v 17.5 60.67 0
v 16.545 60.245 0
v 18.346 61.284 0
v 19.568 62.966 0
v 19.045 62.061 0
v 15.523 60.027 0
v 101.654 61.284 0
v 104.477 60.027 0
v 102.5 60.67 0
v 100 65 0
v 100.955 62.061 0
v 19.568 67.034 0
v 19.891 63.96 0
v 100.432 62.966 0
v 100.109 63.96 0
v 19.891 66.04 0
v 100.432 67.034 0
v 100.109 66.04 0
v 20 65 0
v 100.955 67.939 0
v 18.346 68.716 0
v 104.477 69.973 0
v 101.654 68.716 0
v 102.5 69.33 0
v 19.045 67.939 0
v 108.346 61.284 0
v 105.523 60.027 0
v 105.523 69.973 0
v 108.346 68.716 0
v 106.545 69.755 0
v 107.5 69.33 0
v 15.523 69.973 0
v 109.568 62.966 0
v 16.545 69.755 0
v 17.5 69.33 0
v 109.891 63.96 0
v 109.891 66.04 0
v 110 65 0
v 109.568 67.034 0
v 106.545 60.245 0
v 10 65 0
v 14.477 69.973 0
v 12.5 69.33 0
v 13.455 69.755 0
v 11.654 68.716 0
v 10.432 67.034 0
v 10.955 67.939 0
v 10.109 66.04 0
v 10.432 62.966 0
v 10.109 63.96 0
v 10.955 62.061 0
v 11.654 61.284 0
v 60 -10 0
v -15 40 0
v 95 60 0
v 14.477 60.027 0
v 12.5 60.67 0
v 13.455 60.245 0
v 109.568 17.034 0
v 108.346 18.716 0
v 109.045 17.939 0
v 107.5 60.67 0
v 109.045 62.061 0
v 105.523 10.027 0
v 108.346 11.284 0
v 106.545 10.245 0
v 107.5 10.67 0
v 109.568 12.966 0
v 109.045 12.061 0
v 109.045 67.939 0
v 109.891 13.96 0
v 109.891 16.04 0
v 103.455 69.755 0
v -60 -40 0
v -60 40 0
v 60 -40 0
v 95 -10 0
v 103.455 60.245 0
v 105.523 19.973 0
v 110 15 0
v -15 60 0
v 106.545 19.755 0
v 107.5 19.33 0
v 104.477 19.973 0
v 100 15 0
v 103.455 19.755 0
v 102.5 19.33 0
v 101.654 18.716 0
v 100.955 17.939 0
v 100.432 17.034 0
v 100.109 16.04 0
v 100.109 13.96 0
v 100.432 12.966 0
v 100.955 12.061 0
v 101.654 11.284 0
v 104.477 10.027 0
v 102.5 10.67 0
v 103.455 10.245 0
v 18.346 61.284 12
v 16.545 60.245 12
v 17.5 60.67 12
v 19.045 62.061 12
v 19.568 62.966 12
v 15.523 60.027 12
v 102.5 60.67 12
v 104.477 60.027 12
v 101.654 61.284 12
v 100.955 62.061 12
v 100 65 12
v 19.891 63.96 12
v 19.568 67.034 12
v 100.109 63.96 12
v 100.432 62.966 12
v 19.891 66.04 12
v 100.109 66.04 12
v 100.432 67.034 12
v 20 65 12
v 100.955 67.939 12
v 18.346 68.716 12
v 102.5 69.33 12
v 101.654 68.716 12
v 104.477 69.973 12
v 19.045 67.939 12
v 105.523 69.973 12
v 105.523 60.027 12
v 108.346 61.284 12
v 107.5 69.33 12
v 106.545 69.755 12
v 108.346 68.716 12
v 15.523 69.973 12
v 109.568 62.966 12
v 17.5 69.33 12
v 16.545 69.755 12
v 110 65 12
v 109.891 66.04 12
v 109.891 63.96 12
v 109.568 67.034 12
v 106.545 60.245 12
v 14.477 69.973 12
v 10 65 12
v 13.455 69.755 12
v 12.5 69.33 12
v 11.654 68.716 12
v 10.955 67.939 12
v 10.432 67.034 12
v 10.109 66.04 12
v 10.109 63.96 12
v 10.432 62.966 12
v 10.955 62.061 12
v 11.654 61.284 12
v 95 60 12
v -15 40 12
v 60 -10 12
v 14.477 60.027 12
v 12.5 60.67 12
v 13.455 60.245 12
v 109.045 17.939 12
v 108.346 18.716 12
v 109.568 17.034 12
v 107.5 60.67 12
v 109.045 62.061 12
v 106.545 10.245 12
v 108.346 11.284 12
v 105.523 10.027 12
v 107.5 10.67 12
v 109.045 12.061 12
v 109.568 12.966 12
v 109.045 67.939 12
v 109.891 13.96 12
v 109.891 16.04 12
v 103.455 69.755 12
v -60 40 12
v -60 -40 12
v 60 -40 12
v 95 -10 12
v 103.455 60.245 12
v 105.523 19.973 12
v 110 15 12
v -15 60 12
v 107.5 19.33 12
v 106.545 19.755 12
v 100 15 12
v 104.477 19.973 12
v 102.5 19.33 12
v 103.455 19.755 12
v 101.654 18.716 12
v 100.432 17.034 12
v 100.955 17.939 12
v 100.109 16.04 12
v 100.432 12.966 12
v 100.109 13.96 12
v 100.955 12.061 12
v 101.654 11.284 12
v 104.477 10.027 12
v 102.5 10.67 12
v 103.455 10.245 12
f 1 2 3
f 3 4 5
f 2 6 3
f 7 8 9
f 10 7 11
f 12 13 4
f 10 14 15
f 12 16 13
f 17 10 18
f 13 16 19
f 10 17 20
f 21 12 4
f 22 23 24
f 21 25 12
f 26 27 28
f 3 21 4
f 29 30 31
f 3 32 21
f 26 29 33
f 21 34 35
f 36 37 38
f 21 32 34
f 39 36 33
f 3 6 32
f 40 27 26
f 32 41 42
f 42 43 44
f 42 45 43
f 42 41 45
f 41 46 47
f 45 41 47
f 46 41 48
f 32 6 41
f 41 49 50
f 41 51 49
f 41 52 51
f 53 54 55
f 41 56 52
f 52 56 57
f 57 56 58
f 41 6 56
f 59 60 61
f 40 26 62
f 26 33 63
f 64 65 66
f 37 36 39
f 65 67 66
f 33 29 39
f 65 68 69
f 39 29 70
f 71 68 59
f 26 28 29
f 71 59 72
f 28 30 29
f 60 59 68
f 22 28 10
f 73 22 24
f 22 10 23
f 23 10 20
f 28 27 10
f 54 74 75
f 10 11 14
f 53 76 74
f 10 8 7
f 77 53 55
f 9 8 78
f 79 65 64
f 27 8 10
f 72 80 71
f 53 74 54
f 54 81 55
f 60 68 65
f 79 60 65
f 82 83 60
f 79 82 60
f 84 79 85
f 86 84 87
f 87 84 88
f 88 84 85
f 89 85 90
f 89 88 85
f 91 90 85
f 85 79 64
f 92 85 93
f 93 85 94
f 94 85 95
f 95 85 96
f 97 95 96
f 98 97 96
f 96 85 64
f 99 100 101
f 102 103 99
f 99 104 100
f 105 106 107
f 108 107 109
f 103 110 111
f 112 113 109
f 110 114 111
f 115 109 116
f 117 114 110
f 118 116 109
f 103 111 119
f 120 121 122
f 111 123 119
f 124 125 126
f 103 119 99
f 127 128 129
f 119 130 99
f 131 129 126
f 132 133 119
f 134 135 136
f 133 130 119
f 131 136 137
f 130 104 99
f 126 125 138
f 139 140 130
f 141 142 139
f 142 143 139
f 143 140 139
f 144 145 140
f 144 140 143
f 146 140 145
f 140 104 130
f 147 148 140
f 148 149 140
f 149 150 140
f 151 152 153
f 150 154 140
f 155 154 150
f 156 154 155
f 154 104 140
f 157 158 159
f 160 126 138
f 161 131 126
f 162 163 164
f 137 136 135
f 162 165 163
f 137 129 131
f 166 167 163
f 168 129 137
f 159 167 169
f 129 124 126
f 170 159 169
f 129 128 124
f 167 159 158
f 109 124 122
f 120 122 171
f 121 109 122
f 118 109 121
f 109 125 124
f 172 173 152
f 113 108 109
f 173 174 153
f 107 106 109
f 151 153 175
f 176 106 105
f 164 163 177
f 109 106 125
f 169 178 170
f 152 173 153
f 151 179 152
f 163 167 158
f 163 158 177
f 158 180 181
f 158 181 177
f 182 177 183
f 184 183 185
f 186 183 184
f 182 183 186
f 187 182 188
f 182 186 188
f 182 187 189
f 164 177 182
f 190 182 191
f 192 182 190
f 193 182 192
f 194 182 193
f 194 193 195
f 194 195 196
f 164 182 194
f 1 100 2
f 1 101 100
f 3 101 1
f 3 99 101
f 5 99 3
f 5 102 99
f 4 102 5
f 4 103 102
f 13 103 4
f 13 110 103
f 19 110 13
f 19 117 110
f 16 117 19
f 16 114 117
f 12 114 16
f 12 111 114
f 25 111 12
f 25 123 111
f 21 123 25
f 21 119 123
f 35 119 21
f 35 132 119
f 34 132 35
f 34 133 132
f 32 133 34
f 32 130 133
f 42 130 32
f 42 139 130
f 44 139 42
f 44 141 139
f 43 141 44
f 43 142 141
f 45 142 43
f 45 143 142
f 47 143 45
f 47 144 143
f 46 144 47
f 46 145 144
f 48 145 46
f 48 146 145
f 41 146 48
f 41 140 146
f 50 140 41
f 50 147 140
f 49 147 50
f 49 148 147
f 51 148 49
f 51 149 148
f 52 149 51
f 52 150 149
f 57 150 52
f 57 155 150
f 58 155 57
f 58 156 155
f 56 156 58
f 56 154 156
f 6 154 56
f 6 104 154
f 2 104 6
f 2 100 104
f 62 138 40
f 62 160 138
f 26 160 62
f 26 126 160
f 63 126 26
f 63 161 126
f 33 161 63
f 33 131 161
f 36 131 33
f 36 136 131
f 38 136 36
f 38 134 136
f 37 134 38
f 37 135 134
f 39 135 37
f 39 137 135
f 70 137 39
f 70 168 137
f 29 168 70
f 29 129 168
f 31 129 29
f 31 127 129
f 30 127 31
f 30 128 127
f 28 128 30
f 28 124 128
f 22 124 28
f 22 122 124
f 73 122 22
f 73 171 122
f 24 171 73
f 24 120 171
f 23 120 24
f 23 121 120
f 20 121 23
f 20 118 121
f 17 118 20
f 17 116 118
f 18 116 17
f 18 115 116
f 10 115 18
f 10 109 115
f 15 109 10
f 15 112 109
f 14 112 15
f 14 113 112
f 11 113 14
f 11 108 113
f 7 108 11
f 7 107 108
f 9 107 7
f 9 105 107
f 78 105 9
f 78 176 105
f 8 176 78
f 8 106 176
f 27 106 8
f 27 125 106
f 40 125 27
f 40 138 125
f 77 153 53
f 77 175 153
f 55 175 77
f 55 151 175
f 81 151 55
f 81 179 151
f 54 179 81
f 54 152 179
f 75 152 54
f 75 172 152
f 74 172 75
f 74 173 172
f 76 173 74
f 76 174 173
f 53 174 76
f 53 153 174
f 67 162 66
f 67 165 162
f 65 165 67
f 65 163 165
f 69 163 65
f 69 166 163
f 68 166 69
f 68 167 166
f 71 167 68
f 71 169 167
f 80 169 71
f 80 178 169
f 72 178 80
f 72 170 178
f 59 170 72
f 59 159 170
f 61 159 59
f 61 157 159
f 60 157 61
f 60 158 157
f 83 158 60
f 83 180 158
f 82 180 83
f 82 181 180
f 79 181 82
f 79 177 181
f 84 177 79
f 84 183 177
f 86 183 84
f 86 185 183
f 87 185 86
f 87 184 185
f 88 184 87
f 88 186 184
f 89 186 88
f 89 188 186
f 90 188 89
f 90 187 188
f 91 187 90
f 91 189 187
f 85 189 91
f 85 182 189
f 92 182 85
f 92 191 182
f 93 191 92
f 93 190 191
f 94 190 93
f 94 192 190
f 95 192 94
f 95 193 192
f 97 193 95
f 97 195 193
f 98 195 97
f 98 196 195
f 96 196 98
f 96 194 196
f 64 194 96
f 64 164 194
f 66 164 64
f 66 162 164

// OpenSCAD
module rounded_rectangle(width, height, radius) {
    difference() {
        square([width, height], center=true);
        circle(r=radius, $fn=30);
    }
}

module rounded_circle(radius) {
    circle(r=radius, $fn=30);
}

width = 120;
height = 80;
radius = 5;

linear_extrude(height=12) {
    // Main rectangle
    square([width, height], center=true);

    // Holes
    translate([15, 15, 0]) rounded_circle(radius);
    translate([105, 15, 0]) rounded_circle(radius);
    translate([15, 65, 0]) rounded_circle(radius);
    translate([105, 65, 0]) rounded_circle(radius);

    // Inner rectangle
    translate([40, 25, 0]) square([width - 2 * radius, height - 2 * radius], center=true);
}
